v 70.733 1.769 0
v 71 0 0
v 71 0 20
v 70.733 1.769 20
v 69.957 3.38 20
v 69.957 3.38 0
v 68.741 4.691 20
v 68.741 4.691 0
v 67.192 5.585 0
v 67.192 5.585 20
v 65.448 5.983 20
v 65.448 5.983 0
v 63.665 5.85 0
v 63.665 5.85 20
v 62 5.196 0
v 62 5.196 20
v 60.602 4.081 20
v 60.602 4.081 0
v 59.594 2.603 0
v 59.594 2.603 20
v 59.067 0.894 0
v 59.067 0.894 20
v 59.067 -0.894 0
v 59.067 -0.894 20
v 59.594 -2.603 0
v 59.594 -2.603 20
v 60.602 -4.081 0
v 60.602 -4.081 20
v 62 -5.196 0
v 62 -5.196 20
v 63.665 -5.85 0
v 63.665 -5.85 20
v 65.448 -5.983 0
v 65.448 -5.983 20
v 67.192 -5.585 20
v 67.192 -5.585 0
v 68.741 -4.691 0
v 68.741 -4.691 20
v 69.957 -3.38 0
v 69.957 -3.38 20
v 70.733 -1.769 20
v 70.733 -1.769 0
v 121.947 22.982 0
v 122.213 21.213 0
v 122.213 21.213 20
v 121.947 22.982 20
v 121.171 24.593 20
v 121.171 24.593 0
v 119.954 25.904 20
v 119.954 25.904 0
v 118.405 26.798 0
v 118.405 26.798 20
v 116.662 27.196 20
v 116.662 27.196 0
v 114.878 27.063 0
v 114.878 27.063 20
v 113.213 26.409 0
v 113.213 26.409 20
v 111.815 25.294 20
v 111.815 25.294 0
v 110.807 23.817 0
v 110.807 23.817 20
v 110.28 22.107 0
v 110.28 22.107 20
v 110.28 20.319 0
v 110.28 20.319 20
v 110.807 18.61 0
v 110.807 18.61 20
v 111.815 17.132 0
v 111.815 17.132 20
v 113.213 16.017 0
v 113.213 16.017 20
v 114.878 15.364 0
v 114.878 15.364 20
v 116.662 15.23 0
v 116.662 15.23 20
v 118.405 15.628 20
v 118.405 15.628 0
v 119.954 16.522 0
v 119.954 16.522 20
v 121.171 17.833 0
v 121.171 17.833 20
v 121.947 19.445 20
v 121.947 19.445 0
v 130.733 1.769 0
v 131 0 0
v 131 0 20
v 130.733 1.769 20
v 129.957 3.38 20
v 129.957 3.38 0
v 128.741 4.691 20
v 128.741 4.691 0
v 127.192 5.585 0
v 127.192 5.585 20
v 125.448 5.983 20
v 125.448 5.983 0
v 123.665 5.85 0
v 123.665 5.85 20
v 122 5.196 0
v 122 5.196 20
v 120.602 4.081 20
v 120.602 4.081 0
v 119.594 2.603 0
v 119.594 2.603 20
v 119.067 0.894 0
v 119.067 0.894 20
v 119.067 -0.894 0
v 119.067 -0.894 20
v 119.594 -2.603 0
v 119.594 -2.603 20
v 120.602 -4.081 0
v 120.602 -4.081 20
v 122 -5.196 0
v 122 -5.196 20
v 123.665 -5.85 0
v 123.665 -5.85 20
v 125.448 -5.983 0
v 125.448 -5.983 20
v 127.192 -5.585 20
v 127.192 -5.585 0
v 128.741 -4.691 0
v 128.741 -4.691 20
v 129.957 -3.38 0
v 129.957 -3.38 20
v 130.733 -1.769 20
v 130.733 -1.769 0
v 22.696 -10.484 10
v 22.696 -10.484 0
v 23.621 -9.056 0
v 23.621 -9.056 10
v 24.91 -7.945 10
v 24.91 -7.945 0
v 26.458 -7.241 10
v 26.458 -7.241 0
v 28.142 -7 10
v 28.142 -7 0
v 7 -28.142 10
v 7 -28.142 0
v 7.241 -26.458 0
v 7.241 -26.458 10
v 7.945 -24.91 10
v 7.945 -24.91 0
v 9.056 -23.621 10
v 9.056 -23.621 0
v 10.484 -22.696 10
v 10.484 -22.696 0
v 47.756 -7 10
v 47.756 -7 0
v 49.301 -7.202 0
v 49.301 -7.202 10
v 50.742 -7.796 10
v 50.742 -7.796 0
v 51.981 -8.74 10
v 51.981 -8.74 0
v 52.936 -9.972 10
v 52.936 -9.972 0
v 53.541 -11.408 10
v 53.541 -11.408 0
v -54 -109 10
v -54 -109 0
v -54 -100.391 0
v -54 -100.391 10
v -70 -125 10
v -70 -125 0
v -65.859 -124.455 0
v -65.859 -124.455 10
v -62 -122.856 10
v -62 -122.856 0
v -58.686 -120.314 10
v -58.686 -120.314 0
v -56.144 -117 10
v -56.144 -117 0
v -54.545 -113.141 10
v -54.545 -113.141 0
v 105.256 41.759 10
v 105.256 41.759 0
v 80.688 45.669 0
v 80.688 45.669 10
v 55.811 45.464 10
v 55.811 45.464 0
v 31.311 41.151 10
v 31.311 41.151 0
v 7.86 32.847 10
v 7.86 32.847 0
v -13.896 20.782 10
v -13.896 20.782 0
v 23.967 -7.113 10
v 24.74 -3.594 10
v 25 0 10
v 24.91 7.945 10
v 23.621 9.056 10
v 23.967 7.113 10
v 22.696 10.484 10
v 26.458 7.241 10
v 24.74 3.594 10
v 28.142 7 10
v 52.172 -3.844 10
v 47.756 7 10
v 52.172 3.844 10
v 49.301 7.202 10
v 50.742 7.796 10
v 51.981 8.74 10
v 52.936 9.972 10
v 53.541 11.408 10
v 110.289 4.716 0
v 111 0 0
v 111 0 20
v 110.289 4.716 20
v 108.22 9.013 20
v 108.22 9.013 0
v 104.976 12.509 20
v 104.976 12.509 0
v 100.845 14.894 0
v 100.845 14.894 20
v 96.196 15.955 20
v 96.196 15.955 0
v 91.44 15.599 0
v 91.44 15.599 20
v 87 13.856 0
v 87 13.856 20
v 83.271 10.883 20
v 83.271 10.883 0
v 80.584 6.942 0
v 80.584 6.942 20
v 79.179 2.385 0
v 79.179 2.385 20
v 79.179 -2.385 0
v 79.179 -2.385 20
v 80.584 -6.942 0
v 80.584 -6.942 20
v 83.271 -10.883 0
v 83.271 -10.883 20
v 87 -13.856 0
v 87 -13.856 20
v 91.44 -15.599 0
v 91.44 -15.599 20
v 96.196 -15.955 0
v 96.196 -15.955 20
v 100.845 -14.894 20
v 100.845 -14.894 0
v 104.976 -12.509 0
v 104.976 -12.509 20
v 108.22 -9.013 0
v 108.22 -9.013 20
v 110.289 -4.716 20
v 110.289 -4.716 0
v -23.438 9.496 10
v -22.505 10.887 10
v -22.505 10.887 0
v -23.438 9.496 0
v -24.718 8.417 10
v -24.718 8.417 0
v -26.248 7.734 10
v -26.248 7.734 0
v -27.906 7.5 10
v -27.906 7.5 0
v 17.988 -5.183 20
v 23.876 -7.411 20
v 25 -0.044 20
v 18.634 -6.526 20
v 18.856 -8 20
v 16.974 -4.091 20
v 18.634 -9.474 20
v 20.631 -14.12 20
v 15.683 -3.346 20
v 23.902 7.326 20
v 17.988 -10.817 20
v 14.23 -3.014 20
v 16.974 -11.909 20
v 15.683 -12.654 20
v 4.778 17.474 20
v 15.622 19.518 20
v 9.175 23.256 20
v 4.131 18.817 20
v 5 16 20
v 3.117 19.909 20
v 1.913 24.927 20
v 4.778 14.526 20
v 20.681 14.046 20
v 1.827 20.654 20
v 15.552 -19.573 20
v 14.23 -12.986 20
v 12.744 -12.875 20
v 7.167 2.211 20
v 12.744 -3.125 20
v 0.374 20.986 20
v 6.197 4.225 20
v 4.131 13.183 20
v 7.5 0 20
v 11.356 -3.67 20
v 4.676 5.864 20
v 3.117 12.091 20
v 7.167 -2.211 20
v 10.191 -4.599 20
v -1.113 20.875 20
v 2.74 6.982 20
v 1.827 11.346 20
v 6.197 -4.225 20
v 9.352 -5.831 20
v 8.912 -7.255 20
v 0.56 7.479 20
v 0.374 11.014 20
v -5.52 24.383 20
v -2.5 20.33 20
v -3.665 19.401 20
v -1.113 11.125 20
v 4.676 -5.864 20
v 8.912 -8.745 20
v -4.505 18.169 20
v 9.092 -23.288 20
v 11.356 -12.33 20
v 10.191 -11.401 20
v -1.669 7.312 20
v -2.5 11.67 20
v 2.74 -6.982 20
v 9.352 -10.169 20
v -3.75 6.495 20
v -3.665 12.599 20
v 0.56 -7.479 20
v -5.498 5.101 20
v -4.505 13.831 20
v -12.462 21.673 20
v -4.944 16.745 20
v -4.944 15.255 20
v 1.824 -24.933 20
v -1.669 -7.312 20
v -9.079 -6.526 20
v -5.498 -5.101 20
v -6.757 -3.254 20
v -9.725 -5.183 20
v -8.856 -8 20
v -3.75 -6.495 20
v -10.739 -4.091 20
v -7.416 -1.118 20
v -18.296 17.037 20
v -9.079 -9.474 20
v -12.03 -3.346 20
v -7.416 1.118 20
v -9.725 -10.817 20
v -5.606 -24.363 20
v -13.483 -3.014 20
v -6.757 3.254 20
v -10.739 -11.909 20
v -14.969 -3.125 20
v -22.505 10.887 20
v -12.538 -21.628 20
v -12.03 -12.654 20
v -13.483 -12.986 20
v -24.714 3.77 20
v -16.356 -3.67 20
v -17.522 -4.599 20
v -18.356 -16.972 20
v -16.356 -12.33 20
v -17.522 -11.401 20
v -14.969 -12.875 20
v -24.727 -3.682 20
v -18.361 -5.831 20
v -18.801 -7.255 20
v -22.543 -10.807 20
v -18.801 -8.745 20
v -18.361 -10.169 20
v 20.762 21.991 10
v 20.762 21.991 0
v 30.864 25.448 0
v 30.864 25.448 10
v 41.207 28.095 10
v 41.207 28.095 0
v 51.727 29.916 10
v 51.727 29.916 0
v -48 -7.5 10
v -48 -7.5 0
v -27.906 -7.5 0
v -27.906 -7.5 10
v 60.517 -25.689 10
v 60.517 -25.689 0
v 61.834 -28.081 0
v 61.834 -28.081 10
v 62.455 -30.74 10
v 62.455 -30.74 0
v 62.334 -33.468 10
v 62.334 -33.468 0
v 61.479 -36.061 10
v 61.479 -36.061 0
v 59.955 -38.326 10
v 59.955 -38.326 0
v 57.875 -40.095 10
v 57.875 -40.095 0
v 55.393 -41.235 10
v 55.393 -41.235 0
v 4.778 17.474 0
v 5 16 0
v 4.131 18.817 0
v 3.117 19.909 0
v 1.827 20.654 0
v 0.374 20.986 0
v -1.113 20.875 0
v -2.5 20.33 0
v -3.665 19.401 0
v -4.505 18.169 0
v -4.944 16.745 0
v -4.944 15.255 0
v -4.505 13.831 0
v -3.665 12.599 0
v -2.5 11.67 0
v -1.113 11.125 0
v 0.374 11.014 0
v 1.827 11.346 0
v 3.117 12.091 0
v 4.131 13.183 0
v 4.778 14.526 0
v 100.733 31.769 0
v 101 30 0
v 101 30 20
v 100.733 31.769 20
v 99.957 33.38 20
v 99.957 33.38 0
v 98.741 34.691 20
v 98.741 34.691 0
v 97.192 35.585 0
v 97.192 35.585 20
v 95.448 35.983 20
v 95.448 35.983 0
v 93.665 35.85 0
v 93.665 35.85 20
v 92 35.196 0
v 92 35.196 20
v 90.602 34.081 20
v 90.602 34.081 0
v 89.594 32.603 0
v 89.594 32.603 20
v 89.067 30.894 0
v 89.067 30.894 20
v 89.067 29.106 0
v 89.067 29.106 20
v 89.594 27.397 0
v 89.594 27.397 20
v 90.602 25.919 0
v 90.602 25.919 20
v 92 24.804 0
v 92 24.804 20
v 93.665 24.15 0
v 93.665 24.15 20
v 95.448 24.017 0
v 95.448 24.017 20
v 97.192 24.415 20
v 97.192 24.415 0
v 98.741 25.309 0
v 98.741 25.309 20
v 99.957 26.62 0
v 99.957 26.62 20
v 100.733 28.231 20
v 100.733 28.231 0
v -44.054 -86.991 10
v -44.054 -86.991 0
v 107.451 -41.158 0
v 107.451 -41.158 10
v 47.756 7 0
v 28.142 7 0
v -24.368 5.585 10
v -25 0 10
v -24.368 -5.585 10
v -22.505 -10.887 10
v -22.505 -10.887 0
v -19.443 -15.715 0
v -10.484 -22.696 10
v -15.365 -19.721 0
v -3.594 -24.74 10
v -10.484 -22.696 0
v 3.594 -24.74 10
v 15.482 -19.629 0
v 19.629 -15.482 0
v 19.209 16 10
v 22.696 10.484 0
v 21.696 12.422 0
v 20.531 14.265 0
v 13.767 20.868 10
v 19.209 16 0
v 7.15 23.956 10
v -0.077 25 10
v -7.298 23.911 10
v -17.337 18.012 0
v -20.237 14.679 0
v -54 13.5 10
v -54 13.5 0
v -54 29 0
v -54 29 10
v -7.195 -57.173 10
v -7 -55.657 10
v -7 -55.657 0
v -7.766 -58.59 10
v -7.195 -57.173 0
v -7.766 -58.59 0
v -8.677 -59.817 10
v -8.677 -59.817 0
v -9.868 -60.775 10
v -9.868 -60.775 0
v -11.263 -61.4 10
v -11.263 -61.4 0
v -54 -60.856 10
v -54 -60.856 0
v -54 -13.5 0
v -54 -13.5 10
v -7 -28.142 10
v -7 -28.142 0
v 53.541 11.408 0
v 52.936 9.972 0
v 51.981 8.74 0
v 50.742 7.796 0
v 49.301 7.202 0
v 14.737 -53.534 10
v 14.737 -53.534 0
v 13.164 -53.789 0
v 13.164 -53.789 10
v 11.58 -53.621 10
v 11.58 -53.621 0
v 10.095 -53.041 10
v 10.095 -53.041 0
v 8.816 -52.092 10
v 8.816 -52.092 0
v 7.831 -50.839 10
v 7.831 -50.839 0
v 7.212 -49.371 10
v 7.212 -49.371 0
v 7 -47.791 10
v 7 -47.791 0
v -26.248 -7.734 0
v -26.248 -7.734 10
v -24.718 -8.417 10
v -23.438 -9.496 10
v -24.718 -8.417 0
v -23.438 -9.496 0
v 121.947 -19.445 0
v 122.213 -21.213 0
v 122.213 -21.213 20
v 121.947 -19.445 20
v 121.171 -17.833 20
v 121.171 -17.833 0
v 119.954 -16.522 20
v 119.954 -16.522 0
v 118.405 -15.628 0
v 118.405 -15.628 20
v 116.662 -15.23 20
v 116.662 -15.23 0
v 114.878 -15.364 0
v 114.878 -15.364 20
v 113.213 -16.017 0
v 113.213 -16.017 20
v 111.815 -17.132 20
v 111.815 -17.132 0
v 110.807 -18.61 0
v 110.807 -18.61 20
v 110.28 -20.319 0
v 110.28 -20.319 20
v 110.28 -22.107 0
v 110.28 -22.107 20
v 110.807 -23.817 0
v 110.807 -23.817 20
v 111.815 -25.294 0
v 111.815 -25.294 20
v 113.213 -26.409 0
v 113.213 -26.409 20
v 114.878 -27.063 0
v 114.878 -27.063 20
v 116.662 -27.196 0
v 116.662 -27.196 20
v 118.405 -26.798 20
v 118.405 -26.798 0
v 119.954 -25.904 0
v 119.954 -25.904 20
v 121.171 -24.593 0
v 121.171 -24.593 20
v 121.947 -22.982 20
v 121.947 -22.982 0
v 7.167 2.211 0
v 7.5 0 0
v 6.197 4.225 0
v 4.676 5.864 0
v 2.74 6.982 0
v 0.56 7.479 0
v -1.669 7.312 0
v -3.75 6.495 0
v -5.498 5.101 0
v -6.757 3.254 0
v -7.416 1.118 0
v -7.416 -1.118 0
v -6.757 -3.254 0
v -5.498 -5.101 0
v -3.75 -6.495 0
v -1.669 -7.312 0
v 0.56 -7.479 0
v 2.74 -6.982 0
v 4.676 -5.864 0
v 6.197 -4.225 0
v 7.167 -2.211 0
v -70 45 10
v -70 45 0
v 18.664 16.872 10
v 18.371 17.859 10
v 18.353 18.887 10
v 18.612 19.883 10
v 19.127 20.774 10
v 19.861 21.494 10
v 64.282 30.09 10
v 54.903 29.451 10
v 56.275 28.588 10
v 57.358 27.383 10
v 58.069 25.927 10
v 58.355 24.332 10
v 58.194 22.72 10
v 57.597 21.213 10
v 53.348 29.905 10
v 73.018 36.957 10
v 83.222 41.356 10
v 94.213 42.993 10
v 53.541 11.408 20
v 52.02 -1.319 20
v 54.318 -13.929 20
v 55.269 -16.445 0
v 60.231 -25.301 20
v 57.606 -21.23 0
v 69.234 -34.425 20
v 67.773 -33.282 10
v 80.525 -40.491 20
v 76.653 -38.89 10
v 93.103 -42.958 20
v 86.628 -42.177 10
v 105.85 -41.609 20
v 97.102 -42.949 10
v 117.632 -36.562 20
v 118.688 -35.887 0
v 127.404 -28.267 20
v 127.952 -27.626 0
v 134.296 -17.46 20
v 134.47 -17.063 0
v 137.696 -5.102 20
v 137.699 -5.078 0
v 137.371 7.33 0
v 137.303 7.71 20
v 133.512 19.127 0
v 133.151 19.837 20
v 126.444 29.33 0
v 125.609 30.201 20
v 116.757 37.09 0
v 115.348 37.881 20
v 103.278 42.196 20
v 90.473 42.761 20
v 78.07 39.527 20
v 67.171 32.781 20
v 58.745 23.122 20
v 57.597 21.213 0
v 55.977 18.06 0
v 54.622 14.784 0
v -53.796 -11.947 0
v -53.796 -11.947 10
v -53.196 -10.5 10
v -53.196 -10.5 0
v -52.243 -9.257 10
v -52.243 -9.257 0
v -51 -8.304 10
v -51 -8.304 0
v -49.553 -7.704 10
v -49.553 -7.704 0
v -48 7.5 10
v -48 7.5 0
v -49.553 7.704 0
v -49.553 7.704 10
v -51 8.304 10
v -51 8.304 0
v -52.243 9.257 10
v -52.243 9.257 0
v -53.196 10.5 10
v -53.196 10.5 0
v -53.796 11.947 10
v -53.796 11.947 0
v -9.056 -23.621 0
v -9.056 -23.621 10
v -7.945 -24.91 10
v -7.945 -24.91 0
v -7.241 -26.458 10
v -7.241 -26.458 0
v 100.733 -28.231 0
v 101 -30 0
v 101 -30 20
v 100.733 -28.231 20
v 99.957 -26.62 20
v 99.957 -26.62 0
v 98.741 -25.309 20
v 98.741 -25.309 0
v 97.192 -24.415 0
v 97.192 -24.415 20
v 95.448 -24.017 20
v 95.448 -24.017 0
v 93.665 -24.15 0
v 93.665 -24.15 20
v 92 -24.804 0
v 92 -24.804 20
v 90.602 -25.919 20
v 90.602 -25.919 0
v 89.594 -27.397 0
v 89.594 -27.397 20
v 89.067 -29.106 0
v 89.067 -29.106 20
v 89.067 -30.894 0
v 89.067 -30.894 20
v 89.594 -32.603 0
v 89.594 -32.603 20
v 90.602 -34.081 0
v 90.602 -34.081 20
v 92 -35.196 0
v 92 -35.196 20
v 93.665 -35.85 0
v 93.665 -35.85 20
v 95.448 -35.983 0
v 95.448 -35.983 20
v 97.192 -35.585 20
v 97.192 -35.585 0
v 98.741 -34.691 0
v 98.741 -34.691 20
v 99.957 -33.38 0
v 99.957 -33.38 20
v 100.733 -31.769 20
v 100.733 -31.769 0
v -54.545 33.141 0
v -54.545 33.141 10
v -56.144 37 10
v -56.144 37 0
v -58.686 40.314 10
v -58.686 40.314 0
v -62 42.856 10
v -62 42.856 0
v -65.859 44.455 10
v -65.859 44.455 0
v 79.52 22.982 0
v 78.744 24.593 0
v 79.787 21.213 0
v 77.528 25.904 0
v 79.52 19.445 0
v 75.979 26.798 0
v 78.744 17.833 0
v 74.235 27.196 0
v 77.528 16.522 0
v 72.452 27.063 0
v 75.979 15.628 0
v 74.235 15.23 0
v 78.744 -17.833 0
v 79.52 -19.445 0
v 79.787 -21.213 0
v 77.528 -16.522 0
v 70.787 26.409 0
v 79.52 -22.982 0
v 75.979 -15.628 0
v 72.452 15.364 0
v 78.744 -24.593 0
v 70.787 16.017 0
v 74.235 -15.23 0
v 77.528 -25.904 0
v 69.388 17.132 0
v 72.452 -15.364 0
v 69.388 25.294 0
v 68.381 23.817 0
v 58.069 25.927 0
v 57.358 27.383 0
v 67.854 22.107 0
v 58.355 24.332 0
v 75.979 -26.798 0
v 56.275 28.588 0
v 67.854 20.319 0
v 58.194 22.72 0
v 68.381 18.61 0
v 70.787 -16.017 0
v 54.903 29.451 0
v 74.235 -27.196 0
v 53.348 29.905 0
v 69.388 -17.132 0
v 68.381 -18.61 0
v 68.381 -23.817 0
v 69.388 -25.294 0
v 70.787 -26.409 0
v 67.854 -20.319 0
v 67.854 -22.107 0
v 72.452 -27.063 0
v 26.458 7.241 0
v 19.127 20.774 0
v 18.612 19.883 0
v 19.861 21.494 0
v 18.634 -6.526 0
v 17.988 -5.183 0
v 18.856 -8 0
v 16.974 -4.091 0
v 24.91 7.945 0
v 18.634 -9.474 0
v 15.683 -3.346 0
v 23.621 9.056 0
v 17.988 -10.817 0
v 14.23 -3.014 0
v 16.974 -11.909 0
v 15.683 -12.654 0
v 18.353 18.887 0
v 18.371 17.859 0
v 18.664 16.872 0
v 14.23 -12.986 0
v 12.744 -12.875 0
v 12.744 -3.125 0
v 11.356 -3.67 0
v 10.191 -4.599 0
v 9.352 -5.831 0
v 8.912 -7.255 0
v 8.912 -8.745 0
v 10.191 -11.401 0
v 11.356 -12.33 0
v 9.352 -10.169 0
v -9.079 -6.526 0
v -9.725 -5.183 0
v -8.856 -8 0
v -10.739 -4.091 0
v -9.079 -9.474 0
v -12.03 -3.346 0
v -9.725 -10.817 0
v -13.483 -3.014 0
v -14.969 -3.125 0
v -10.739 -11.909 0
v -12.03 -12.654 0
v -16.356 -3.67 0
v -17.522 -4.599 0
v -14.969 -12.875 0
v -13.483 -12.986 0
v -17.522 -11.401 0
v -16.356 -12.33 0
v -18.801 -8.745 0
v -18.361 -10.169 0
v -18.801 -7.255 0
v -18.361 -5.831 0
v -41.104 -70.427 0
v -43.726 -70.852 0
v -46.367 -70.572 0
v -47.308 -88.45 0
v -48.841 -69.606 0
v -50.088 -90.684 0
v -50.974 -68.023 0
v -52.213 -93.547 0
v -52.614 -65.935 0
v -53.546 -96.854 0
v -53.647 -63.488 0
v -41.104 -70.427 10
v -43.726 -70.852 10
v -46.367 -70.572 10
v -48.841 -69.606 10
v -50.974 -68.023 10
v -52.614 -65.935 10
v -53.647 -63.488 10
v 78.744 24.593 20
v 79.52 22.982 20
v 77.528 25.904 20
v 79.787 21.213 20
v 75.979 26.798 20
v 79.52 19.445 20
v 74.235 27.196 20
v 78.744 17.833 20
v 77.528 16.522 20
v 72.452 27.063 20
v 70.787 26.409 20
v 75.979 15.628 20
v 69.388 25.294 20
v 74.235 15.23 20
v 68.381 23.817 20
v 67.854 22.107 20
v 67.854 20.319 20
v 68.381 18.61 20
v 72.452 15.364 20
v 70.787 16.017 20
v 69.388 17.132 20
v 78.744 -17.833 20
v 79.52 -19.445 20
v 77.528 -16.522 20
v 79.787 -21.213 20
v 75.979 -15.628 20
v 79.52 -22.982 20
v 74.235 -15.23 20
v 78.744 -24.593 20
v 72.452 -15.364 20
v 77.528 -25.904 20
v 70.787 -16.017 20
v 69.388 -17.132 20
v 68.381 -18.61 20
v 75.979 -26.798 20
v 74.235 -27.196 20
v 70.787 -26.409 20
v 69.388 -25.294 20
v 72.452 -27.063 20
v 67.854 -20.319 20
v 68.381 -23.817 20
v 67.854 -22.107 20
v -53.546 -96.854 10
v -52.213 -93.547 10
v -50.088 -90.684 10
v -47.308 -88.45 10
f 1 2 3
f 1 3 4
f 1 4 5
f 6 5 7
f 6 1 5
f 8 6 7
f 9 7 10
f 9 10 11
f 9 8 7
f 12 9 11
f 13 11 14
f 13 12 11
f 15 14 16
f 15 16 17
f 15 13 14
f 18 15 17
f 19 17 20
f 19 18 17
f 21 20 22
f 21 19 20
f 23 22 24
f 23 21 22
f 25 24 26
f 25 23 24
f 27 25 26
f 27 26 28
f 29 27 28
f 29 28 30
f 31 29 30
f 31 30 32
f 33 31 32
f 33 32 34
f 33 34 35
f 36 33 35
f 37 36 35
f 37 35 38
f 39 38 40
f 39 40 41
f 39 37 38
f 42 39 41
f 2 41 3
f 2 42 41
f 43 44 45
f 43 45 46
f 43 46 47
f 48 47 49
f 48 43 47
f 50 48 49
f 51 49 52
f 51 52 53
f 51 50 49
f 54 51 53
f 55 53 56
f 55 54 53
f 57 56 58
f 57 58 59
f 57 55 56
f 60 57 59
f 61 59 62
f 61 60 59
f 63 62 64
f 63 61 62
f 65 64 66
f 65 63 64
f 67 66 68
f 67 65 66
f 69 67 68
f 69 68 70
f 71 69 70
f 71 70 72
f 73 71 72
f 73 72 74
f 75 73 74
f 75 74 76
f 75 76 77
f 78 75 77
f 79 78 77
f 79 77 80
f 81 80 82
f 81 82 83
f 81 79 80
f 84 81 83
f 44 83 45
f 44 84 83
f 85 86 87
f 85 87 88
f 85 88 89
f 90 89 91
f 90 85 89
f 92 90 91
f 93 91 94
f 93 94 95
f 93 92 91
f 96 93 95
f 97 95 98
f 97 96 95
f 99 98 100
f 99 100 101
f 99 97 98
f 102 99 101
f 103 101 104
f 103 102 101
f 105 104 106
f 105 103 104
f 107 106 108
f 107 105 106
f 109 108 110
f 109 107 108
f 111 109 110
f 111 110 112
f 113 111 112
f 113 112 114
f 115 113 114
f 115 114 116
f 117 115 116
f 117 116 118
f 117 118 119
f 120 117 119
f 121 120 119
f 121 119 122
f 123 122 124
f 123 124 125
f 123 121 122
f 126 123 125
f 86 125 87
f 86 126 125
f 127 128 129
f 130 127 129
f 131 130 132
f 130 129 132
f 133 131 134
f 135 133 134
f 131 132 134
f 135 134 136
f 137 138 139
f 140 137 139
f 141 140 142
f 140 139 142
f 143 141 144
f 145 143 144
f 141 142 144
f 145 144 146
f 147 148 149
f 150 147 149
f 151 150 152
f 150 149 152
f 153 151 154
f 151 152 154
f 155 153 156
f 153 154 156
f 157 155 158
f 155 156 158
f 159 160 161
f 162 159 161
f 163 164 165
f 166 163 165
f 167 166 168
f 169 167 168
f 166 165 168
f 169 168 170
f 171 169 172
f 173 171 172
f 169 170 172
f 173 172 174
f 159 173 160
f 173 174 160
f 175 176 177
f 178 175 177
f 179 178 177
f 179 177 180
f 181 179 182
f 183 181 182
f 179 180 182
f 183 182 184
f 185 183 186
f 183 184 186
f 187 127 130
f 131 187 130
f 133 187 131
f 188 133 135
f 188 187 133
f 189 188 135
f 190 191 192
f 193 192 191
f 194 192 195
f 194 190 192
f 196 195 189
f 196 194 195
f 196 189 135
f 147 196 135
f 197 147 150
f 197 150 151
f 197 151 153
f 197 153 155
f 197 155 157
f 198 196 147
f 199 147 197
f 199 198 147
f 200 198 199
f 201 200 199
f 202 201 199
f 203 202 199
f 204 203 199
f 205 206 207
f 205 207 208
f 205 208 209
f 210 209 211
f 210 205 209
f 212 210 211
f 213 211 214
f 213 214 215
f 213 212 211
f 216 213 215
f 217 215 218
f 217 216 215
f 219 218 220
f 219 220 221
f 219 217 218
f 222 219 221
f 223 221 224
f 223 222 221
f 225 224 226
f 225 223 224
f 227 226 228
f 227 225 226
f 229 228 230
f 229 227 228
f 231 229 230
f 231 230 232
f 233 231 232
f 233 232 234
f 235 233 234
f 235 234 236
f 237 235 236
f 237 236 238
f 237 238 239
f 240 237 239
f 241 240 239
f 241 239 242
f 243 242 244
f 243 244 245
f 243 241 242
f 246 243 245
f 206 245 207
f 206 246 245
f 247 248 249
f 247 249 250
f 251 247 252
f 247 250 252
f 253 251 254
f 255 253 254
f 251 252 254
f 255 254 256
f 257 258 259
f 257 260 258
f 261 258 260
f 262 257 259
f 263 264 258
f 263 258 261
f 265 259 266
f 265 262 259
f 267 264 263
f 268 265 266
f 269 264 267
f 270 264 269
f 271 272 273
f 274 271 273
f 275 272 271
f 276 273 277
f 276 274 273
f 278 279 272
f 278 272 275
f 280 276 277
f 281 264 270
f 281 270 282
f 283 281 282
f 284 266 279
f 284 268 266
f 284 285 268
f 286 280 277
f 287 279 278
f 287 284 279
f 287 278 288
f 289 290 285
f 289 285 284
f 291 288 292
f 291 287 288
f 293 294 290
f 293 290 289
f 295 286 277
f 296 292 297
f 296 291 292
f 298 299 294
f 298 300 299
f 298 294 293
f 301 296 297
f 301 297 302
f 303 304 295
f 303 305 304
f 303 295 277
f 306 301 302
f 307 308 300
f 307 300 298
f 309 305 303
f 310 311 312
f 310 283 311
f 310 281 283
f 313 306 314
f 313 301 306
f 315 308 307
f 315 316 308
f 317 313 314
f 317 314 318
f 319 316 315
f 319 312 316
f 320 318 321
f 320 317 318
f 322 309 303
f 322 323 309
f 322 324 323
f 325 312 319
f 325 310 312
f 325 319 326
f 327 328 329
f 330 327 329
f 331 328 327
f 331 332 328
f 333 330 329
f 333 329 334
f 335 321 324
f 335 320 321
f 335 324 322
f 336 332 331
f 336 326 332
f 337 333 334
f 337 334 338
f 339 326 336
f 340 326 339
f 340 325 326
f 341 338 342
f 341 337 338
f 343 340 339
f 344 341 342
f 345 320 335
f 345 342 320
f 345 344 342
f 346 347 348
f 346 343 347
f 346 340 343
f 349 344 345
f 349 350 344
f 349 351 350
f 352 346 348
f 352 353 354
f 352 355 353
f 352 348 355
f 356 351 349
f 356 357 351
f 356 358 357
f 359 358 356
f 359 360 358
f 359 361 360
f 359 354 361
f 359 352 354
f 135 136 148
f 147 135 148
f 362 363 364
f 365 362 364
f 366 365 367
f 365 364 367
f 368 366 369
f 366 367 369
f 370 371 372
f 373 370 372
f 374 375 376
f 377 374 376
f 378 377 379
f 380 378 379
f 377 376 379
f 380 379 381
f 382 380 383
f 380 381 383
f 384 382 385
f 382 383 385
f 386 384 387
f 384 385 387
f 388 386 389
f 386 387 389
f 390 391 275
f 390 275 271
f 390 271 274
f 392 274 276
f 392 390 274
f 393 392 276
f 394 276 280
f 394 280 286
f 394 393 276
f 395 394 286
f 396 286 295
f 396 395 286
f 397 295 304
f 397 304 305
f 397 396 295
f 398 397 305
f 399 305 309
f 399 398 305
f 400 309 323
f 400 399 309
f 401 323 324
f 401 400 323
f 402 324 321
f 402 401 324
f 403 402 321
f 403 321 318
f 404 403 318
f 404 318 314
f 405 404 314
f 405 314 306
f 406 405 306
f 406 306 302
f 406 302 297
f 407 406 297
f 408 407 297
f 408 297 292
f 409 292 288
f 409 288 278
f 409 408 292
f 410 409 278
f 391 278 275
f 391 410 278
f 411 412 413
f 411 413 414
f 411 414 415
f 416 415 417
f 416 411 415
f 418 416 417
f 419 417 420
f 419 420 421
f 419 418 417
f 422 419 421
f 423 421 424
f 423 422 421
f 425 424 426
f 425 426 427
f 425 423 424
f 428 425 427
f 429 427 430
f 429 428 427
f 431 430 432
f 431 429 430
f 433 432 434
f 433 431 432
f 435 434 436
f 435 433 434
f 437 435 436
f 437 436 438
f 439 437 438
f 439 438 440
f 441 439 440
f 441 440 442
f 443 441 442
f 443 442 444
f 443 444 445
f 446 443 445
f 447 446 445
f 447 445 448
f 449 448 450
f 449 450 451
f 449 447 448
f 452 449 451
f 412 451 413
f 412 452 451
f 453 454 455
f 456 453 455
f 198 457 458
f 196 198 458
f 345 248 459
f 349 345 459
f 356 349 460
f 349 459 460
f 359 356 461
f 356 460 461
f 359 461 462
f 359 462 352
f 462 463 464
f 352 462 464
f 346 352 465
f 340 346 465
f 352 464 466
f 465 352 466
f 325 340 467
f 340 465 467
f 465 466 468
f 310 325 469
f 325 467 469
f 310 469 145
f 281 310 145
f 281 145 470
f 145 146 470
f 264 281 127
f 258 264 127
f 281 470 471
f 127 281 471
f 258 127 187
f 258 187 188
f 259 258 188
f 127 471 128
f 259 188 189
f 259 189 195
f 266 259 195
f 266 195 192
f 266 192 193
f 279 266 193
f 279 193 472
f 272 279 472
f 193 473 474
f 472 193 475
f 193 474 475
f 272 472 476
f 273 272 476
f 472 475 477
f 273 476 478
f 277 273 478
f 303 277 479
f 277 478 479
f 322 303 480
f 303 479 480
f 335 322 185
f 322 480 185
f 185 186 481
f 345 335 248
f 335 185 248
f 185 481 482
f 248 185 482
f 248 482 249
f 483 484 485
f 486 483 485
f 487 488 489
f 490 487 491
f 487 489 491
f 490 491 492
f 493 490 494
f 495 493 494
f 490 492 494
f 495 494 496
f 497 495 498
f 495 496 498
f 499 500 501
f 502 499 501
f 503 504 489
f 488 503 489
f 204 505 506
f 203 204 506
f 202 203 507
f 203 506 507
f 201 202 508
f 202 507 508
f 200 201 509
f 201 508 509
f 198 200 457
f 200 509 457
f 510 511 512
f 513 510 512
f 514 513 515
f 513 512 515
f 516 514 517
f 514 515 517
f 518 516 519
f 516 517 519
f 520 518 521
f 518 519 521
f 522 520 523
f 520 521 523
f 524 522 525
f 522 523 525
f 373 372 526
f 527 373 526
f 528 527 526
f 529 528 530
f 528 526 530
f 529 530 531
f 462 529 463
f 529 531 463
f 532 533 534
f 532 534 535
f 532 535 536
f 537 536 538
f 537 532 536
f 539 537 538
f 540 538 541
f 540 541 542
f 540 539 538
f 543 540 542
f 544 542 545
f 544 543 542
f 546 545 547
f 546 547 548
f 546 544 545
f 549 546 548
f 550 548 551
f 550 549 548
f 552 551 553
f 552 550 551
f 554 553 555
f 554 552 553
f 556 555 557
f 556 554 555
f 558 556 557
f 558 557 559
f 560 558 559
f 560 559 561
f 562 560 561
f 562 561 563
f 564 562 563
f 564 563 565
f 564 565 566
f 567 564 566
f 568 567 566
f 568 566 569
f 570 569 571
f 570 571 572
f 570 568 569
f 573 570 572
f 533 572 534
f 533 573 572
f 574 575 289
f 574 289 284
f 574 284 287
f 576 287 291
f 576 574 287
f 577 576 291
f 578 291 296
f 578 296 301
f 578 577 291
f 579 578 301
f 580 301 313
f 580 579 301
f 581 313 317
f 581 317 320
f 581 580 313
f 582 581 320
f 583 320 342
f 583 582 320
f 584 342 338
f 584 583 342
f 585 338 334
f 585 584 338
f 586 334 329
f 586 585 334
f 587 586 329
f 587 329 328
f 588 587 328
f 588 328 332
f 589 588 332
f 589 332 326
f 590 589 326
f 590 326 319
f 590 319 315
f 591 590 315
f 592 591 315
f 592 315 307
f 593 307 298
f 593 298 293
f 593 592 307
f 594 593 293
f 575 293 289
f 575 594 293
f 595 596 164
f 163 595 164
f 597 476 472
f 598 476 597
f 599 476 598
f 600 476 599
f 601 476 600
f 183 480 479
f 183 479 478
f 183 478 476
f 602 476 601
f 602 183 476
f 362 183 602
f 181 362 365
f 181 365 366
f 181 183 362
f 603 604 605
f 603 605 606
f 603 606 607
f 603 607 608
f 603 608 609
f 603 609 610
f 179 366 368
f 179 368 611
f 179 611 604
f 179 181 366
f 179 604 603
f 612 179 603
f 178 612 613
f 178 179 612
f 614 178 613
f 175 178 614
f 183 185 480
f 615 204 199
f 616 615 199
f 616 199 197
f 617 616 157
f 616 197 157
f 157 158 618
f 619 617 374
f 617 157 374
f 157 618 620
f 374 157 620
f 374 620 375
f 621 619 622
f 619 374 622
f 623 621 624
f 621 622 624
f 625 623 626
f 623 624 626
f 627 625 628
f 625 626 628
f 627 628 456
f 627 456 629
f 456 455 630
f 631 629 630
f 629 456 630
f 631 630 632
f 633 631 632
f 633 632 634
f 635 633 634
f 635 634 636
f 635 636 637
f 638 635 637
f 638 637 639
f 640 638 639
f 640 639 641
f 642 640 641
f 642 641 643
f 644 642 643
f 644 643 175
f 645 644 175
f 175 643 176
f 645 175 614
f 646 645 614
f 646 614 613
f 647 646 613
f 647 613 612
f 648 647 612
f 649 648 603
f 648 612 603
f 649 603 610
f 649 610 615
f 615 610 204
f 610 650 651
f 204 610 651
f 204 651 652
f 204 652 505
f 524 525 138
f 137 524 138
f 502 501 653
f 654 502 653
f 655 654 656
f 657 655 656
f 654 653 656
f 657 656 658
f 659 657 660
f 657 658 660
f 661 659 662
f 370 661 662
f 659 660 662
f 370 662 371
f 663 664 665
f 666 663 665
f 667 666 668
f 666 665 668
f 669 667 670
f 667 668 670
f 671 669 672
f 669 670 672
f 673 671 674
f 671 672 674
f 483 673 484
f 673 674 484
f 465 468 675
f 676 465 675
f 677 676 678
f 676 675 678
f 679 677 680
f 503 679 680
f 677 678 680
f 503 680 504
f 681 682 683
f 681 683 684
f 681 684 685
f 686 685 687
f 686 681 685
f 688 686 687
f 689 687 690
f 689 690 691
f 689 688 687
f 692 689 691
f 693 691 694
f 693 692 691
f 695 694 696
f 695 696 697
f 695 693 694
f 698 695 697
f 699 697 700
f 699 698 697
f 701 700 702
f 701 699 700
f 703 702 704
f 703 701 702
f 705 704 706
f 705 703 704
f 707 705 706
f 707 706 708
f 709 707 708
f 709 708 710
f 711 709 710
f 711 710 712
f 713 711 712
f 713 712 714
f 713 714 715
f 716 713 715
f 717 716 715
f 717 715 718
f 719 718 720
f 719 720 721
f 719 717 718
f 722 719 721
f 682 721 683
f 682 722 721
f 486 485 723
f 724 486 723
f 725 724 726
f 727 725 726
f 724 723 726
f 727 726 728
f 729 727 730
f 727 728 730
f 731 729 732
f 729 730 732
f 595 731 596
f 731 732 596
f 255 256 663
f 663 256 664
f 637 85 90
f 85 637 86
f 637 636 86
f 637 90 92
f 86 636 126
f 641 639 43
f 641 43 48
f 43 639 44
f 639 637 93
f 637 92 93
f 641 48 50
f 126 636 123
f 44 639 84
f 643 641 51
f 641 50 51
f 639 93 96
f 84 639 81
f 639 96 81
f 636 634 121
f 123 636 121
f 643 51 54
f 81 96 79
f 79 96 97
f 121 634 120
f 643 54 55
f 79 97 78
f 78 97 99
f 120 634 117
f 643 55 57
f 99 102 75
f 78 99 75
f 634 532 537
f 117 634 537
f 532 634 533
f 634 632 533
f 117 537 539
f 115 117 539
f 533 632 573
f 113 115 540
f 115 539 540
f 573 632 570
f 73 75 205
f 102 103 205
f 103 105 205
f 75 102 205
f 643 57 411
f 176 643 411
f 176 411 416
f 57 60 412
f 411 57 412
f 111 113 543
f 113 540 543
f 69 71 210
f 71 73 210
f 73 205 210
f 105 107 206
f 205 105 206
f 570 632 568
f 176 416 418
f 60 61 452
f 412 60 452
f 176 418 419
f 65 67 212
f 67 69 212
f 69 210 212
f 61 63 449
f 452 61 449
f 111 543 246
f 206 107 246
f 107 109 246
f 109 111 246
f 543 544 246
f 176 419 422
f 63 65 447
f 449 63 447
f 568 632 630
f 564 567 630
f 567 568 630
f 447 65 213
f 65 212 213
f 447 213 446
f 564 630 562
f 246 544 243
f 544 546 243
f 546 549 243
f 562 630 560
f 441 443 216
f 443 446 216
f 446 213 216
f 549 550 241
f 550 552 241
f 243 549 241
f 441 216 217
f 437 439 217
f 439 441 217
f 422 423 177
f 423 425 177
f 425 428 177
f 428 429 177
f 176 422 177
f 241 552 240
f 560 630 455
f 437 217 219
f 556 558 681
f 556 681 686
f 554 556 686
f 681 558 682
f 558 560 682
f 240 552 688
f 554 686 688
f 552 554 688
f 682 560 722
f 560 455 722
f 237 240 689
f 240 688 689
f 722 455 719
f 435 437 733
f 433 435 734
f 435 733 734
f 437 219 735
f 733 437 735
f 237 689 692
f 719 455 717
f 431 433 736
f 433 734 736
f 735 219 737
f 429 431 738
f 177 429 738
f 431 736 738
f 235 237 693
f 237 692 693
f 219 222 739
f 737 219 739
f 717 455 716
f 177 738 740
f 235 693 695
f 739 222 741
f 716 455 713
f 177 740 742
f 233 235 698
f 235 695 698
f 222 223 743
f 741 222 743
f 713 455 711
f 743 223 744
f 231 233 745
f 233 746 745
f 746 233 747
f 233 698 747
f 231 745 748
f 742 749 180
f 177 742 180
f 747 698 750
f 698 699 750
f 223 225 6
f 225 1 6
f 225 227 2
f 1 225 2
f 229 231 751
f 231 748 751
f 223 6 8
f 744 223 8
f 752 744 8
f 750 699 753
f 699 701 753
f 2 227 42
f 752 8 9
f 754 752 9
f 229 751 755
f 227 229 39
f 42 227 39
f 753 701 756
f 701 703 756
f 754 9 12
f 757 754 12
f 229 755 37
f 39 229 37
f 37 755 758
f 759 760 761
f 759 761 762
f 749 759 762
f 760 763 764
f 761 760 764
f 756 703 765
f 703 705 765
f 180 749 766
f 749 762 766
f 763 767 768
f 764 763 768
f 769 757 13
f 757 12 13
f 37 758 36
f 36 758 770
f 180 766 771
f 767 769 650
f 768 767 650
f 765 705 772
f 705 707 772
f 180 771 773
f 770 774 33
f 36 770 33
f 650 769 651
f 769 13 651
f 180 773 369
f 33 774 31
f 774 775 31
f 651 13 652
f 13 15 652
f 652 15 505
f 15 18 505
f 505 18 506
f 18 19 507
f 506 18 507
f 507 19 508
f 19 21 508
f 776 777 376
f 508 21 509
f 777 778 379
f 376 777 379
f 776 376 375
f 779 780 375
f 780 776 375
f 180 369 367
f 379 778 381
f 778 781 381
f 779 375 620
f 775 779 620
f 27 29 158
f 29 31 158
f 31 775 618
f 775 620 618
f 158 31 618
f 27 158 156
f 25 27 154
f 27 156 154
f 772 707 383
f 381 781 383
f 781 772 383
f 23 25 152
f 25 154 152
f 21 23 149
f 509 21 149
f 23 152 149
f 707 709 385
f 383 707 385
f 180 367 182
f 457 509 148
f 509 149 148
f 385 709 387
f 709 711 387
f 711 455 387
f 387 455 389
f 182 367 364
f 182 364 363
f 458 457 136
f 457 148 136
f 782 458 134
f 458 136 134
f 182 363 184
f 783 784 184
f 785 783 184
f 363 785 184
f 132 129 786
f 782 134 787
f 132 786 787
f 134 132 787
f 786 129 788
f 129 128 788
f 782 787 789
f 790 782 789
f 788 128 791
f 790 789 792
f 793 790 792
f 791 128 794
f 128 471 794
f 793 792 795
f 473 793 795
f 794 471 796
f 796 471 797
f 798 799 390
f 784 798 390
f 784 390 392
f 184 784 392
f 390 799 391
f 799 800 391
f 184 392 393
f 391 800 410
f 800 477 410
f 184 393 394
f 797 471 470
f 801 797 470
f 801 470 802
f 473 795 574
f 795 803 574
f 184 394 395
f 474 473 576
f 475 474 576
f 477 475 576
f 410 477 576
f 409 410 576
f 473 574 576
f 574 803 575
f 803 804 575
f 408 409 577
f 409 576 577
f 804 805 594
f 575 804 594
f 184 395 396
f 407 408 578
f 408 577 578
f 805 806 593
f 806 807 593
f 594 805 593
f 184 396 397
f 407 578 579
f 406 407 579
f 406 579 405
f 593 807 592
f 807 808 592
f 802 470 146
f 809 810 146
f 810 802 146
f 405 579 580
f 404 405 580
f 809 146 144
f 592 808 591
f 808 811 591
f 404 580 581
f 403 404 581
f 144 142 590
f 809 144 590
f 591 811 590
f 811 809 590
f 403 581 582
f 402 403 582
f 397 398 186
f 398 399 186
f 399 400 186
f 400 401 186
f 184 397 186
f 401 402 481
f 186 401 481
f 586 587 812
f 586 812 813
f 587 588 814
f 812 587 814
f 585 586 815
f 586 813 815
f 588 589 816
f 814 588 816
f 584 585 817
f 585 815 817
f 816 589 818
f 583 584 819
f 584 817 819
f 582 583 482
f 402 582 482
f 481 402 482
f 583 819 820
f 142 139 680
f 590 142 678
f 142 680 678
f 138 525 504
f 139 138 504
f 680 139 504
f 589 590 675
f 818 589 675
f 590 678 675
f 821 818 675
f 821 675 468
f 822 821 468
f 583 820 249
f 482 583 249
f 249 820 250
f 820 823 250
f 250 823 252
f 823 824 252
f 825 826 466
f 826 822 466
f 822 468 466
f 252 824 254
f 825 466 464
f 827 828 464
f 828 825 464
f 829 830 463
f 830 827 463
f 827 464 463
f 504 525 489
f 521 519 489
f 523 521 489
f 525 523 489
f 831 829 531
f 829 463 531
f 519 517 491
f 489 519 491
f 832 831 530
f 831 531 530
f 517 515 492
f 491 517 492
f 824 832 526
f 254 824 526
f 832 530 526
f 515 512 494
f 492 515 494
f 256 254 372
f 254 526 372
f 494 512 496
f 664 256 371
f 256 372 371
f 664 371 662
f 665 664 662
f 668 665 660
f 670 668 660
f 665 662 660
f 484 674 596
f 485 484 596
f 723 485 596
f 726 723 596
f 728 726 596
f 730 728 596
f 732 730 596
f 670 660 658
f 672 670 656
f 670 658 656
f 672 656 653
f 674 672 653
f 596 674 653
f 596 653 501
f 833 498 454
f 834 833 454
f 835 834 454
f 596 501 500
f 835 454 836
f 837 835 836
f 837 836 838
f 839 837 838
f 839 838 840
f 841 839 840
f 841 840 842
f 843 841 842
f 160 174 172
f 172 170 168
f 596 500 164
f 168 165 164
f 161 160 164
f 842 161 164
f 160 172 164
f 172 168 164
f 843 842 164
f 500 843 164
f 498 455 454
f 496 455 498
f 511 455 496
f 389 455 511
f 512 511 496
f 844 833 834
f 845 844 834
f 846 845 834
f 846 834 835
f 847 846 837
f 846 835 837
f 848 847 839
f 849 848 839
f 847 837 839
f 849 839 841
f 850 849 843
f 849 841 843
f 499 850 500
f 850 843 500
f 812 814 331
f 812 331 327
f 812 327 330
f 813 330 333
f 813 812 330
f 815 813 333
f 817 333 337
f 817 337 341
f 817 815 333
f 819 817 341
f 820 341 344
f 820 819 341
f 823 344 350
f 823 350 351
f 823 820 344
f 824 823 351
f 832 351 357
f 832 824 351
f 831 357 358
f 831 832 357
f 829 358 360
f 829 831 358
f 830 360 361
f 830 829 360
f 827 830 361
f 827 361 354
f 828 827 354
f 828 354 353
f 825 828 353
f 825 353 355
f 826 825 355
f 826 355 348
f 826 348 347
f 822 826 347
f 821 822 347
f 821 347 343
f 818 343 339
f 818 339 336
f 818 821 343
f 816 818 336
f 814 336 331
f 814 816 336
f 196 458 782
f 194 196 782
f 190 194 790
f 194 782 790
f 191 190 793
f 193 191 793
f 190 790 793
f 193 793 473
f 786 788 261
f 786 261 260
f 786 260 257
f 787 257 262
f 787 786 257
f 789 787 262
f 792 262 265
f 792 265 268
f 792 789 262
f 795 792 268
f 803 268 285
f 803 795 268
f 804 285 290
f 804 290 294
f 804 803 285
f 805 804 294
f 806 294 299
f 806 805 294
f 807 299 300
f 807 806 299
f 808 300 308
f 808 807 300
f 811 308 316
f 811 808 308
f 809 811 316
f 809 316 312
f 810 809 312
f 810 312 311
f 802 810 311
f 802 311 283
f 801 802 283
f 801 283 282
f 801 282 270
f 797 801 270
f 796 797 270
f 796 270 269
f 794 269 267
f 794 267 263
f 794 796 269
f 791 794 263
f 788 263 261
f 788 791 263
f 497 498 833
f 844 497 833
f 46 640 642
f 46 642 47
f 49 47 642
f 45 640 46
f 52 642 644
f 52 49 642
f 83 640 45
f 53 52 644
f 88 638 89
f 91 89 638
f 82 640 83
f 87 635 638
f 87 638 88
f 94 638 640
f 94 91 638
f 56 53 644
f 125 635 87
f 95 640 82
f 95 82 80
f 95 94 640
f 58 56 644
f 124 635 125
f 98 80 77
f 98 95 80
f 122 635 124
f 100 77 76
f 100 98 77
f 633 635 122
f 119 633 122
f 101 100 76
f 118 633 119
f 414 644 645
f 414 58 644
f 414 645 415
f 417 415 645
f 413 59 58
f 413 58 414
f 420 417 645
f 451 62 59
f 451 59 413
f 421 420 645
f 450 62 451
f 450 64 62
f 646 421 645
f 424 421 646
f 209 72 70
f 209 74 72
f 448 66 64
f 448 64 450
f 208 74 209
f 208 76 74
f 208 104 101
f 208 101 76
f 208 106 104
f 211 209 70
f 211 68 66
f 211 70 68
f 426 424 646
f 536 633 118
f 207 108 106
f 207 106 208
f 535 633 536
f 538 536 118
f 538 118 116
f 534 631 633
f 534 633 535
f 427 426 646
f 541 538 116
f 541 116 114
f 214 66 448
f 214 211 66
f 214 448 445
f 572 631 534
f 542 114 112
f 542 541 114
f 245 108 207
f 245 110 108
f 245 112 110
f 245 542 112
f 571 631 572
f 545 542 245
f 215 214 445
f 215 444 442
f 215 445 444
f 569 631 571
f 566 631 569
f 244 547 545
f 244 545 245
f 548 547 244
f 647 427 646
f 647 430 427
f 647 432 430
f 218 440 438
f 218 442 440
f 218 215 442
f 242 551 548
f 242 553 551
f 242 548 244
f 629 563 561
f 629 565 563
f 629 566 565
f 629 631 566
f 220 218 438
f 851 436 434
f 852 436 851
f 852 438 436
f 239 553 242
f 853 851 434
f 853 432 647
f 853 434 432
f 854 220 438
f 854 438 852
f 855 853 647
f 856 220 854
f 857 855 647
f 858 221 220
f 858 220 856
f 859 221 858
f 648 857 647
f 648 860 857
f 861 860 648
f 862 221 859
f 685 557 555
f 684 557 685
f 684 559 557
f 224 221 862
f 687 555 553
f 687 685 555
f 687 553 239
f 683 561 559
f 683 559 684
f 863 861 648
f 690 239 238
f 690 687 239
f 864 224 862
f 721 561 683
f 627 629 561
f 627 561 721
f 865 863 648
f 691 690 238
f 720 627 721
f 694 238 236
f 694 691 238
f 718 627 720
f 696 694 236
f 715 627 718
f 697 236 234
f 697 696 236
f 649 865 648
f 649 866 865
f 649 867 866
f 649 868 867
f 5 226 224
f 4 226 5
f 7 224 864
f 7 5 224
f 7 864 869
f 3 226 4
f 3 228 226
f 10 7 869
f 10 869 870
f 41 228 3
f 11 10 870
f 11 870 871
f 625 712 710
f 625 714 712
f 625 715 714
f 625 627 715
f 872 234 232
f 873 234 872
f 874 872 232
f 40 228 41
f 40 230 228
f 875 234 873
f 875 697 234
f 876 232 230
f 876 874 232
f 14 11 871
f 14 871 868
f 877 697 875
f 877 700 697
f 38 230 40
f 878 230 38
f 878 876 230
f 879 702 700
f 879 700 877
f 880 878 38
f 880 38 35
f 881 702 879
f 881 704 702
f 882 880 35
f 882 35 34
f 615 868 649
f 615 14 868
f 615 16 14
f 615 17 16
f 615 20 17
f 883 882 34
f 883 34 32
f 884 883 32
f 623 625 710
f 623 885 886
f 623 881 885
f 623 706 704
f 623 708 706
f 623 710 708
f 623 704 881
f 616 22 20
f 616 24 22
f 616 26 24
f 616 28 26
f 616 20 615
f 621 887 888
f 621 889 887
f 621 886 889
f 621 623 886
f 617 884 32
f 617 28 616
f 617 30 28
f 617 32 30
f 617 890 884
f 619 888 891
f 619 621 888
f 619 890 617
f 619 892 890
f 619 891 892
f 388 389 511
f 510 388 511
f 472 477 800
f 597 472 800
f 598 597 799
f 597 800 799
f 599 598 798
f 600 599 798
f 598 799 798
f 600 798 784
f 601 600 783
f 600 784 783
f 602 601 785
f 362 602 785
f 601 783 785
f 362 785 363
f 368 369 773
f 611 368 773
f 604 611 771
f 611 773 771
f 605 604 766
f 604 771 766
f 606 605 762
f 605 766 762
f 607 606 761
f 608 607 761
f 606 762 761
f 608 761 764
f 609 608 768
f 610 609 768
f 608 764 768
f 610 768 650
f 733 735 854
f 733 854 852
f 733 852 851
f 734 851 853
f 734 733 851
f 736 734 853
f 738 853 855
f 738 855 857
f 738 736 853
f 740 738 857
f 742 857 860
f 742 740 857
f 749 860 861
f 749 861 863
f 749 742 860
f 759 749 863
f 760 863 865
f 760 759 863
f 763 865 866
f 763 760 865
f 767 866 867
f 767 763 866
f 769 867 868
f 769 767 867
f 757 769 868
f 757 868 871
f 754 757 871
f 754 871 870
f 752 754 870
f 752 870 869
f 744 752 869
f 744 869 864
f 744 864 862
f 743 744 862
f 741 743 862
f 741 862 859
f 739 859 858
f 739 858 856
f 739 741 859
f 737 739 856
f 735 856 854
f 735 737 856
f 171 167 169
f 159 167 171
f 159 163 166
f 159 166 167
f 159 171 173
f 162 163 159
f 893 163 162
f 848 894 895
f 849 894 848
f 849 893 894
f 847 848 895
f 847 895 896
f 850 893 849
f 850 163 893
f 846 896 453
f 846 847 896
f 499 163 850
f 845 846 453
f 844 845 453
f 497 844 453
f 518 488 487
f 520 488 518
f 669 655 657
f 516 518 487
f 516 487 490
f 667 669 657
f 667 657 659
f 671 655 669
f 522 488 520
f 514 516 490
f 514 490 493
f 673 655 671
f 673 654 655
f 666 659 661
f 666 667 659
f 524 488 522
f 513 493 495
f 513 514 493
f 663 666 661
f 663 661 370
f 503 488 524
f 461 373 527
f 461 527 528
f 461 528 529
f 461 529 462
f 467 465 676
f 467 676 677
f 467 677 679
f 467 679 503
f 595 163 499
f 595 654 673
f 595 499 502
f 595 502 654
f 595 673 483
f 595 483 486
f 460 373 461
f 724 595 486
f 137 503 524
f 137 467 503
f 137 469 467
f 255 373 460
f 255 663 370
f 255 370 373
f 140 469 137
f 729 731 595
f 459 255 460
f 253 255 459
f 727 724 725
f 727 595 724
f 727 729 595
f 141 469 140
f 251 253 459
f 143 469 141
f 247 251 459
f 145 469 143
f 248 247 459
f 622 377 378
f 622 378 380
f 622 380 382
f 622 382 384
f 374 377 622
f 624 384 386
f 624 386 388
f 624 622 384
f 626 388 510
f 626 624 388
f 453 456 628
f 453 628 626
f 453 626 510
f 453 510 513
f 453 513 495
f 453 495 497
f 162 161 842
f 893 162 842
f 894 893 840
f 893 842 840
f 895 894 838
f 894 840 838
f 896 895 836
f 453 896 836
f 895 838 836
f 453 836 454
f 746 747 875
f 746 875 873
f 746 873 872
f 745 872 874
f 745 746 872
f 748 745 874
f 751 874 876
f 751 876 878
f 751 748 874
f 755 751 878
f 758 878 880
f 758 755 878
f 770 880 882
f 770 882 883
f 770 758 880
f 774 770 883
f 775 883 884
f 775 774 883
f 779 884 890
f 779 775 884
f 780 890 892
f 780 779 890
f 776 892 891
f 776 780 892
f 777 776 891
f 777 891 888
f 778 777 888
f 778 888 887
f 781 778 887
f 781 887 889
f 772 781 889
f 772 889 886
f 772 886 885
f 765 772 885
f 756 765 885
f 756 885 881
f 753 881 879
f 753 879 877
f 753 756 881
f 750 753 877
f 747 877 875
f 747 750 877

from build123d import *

# Parameters (mm, degrees)
EXTRUDE_1_DEPTH   = 10
EXTRUDE_1_2_DEPTH = 10
EXTRUDE_1_3_DEPTH = 10
SKETCH_1_3_R      = 43
SKETCH_1_3_R_2    = 6
SKETCH_1_3_R_3    = 16
SKETCH_1_3_R_4    = 25
SKETCH_1_3_R_5    = 5
SKETCH_1_3_R_6    = 7.5
EXTRUDE_2_DEPTH   = 20


with BuildPart() as part:
    # Эскиз1 → Бобышка-Вытянуть1 (new body)
    with BuildSketch(Plane.XY):
        with BuildLine():
            ThreePointArc((-54, 29), (-58.686291501, 40.313708499), (-70, 45))
            Line((-70, 45), (-70, -125))
            ThreePointArc((-70, -125), (-58.686291501, -120.313708499), (-54, -109))
            Line((-54, -109), (-54, -100.391329163))
            ThreePointArc((-54, -100.391329163), (-51.241745904, -92.047280445), (-44.053835854, -86.991089805))
            Line((-44.053835854, -86.991089805), (107.451067266, -41.15787803))
            ThreePointArc((107.451067266, -41.15787803), (81.540043629, -40.839069217), (60.517137347, -25.689145242))
            ThreePointArc((60.517137347, -25.689145242), (61.99532492, -34.793587478), (55.393464002, -41.234964608))
            Line((55.393464002, -41.234964608), (14.737358223, -53.534235903))
            ThreePointArc((14.737358223, -53.534235903), (9.423979121, -52.60916728), (7, -47.791276178))
            Line((7, -47.791276178), (7, -28.142494559))
            ThreePointArc((7, -28.142494559), (7.945458765, -24.909599122), (10.483870968, -22.695560128))
            ThreePointArc((10.483870968, -22.695560128), (0, -25), (-10.483870968, -22.695560128))
            ThreePointArc((-10.483870968, -22.695560128), (-7.945458765, -24.909599122), (-7, -28.142494559))
            Line((-7, -28.142494559), (-7, -55.656787337))
            ThreePointArc((-7, -55.656787337), (-8.182108898, -59.232808217), (-11.262641777, -61.399747063))
            Line((-11.262641777, -61.399747063), (-41.104402961, -70.427466509))
            ThreePointArc((-41.104402961, -70.427466509), (-49.960034799, -68.88568547), (-54, -60.855866967))
            Line((-54, -60.855866967), (-54, -13.5))
            ThreePointArc((-54, -13.5), (-52.242640687, -9.257359313), (-48, -7.5))
            Line((-48, -7.5), (-27.906092525, -7.5))
            ThreePointArc((-27.906092525, -7.5), (-24.718414636, -8.416820908), (-22.504913326, -10.887096774))
            ThreePointArc((-22.504913326, -10.887096774), (-25, 0), (-22.504913326, 10.887096774))
            ThreePointArc((-22.504913326, 10.887096774), (-24.718414636, 8.416820908), (-27.906092525, 7.5))
            Line((-27.906092525, 7.5), (-48, 7.5))
            ThreePointArc((-48, 7.5), (-52.242640687, 9.257359313), (-54, 13.5))
            Line((-54, 13.5), (-54, 29))
        make_face()
    extrude(amount=EXTRUDE_1_DEPTH)



with BuildPart() as body_2:
    # Эскиз1 → Extrude 1 2 (new body)
    with BuildSketch(Plane.XY):
        with BuildLine():
            ThreePointArc((105.256123955, 41.758974142), (43.471517996, 43.816308869), (-13.895789474, 20.782373178))
            ThreePointArc((-13.895789474, 20.782373178), (3.574397154, 24.743154306), (19.209372712, 16))
            ThreePointArc((19.209372712, 16), (18.448719356, 19.393999935), (20.761928319, 21.991478208))
            ThreePointArc((20.761928319, 21.991478208), (36.009186006, 26.873359096), (51.727153653, 29.915910824))
            ThreePointArc((51.727153653, 29.915910824), (57.357710528, 27.382727589), (57.596791581, 21.213203436))
            ThreePointArc((57.596791581, 21.213203436), (77.977273362, 39.487045696), (105.256123955, 41.758974142))
        make_face()
    extrude(amount=EXTRUDE_1_2_DEPTH)


with BuildPart() as body_3:
    # Эскиз1 → Extrude 1 3 (new body)
    with BuildSketch(Plane.XY):
        with BuildLine():
            ThreePointArc((47.755952756, -7), (51.392501916, -8.227630546), (53.540938133, -11.408163265))
            ThreePointArc((53.540938133, -11.408163265), (52, 0), (53.540938133, 11.408163265))
            ThreePointArc((53.540938133, 11.408163265), (51.392501916, 8.227630546), (47.755952756, 7))
            Line((47.755952756, 7), (28.142494559, 7))
            ThreePointArc((28.142494559, 7), (24.909599122, 7.945458765), (22.695560128, 10.483870968))
            ThreePointArc((22.695560128, 10.483870968), (25, 0), (22.695560128, -10.483870968))
            ThreePointArc((22.695560128, -10.483870968), (24.909599122, -7.945458765), (28.142494559, -7))
            Line((28.142494559, -7), (47.755952756, -7))
        make_face()
    extrude(amount=EXTRUDE_1_3_DEPTH)


with BuildPart() as part_1:
    add(part.part)

    add(body_2.part)  # Бобышка-Вытянуть2 merges body 2

    add(body_3.part)  # Бобышка-Вытянуть2 merges body 3
    # Эскиз1<3> → Бобышка-Вытянуть2 (add)
    # profile 1 of 2: a face of its own
    with BuildSketch(Plane.XY):
        with Locations((95, 0)):
            Circle(SKETCH_1_3_R)
        with Locations((73.786796564, -21.213203436)):
            Circle(SKETCH_1_3_R_2, mode=Mode.SUBTRACT)
        with Locations((65, 0)):
            Circle(SKETCH_1_3_R_2, mode=Mode.SUBTRACT)
        with Locations((95, -30)):
            Circle(SKETCH_1_3_R_2, mode=Mode.SUBTRACT)
        with Locations((116.213203436, -21.213203436)):
            Circle(SKETCH_1_3_R_2, mode=Mode.SUBTRACT)
        with Locations((95, 0)):
            Circle(SKETCH_1_3_R_3, mode=Mode.SUBTRACT)
        with Locations((125, 0)):
            Circle(SKETCH_1_3_R_2, mode=Mode.SUBTRACT)
        with Locations((73.786796564, 21.213203436)):
            Circle(SKETCH_1_3_R_2, mode=Mode.SUBTRACT)
        with Locations((116.213203436, 21.213203436)):
            Circle(SKETCH_1_3_R_2, mode=Mode.SUBTRACT)
        with Locations((95, 30)):
            Circle(SKETCH_1_3_R_2, mode=Mode.SUBTRACT)
    # profile 2 of 2: a face of its own
    with BuildSketch(Plane.XY):
        Circle(SKETCH_1_3_R_4)
        with Locations((-13.856406461, -8)):
            Circle(SKETCH_1_3_R_5, mode=Mode.SUBTRACT)
        Circle(SKETCH_1_3_R_6, mode=Mode.SUBTRACT)
        with Locations((13.856406461, -8)):
            Circle(SKETCH_1_3_R_5, mode=Mode.SUBTRACT)
        with Locations((0, 16)):
            Circle(SKETCH_1_3_R_5, mode=Mode.SUBTRACT)
    extrude(amount=EXTRUDE_2_DEPTH)


solid = part_1.part
